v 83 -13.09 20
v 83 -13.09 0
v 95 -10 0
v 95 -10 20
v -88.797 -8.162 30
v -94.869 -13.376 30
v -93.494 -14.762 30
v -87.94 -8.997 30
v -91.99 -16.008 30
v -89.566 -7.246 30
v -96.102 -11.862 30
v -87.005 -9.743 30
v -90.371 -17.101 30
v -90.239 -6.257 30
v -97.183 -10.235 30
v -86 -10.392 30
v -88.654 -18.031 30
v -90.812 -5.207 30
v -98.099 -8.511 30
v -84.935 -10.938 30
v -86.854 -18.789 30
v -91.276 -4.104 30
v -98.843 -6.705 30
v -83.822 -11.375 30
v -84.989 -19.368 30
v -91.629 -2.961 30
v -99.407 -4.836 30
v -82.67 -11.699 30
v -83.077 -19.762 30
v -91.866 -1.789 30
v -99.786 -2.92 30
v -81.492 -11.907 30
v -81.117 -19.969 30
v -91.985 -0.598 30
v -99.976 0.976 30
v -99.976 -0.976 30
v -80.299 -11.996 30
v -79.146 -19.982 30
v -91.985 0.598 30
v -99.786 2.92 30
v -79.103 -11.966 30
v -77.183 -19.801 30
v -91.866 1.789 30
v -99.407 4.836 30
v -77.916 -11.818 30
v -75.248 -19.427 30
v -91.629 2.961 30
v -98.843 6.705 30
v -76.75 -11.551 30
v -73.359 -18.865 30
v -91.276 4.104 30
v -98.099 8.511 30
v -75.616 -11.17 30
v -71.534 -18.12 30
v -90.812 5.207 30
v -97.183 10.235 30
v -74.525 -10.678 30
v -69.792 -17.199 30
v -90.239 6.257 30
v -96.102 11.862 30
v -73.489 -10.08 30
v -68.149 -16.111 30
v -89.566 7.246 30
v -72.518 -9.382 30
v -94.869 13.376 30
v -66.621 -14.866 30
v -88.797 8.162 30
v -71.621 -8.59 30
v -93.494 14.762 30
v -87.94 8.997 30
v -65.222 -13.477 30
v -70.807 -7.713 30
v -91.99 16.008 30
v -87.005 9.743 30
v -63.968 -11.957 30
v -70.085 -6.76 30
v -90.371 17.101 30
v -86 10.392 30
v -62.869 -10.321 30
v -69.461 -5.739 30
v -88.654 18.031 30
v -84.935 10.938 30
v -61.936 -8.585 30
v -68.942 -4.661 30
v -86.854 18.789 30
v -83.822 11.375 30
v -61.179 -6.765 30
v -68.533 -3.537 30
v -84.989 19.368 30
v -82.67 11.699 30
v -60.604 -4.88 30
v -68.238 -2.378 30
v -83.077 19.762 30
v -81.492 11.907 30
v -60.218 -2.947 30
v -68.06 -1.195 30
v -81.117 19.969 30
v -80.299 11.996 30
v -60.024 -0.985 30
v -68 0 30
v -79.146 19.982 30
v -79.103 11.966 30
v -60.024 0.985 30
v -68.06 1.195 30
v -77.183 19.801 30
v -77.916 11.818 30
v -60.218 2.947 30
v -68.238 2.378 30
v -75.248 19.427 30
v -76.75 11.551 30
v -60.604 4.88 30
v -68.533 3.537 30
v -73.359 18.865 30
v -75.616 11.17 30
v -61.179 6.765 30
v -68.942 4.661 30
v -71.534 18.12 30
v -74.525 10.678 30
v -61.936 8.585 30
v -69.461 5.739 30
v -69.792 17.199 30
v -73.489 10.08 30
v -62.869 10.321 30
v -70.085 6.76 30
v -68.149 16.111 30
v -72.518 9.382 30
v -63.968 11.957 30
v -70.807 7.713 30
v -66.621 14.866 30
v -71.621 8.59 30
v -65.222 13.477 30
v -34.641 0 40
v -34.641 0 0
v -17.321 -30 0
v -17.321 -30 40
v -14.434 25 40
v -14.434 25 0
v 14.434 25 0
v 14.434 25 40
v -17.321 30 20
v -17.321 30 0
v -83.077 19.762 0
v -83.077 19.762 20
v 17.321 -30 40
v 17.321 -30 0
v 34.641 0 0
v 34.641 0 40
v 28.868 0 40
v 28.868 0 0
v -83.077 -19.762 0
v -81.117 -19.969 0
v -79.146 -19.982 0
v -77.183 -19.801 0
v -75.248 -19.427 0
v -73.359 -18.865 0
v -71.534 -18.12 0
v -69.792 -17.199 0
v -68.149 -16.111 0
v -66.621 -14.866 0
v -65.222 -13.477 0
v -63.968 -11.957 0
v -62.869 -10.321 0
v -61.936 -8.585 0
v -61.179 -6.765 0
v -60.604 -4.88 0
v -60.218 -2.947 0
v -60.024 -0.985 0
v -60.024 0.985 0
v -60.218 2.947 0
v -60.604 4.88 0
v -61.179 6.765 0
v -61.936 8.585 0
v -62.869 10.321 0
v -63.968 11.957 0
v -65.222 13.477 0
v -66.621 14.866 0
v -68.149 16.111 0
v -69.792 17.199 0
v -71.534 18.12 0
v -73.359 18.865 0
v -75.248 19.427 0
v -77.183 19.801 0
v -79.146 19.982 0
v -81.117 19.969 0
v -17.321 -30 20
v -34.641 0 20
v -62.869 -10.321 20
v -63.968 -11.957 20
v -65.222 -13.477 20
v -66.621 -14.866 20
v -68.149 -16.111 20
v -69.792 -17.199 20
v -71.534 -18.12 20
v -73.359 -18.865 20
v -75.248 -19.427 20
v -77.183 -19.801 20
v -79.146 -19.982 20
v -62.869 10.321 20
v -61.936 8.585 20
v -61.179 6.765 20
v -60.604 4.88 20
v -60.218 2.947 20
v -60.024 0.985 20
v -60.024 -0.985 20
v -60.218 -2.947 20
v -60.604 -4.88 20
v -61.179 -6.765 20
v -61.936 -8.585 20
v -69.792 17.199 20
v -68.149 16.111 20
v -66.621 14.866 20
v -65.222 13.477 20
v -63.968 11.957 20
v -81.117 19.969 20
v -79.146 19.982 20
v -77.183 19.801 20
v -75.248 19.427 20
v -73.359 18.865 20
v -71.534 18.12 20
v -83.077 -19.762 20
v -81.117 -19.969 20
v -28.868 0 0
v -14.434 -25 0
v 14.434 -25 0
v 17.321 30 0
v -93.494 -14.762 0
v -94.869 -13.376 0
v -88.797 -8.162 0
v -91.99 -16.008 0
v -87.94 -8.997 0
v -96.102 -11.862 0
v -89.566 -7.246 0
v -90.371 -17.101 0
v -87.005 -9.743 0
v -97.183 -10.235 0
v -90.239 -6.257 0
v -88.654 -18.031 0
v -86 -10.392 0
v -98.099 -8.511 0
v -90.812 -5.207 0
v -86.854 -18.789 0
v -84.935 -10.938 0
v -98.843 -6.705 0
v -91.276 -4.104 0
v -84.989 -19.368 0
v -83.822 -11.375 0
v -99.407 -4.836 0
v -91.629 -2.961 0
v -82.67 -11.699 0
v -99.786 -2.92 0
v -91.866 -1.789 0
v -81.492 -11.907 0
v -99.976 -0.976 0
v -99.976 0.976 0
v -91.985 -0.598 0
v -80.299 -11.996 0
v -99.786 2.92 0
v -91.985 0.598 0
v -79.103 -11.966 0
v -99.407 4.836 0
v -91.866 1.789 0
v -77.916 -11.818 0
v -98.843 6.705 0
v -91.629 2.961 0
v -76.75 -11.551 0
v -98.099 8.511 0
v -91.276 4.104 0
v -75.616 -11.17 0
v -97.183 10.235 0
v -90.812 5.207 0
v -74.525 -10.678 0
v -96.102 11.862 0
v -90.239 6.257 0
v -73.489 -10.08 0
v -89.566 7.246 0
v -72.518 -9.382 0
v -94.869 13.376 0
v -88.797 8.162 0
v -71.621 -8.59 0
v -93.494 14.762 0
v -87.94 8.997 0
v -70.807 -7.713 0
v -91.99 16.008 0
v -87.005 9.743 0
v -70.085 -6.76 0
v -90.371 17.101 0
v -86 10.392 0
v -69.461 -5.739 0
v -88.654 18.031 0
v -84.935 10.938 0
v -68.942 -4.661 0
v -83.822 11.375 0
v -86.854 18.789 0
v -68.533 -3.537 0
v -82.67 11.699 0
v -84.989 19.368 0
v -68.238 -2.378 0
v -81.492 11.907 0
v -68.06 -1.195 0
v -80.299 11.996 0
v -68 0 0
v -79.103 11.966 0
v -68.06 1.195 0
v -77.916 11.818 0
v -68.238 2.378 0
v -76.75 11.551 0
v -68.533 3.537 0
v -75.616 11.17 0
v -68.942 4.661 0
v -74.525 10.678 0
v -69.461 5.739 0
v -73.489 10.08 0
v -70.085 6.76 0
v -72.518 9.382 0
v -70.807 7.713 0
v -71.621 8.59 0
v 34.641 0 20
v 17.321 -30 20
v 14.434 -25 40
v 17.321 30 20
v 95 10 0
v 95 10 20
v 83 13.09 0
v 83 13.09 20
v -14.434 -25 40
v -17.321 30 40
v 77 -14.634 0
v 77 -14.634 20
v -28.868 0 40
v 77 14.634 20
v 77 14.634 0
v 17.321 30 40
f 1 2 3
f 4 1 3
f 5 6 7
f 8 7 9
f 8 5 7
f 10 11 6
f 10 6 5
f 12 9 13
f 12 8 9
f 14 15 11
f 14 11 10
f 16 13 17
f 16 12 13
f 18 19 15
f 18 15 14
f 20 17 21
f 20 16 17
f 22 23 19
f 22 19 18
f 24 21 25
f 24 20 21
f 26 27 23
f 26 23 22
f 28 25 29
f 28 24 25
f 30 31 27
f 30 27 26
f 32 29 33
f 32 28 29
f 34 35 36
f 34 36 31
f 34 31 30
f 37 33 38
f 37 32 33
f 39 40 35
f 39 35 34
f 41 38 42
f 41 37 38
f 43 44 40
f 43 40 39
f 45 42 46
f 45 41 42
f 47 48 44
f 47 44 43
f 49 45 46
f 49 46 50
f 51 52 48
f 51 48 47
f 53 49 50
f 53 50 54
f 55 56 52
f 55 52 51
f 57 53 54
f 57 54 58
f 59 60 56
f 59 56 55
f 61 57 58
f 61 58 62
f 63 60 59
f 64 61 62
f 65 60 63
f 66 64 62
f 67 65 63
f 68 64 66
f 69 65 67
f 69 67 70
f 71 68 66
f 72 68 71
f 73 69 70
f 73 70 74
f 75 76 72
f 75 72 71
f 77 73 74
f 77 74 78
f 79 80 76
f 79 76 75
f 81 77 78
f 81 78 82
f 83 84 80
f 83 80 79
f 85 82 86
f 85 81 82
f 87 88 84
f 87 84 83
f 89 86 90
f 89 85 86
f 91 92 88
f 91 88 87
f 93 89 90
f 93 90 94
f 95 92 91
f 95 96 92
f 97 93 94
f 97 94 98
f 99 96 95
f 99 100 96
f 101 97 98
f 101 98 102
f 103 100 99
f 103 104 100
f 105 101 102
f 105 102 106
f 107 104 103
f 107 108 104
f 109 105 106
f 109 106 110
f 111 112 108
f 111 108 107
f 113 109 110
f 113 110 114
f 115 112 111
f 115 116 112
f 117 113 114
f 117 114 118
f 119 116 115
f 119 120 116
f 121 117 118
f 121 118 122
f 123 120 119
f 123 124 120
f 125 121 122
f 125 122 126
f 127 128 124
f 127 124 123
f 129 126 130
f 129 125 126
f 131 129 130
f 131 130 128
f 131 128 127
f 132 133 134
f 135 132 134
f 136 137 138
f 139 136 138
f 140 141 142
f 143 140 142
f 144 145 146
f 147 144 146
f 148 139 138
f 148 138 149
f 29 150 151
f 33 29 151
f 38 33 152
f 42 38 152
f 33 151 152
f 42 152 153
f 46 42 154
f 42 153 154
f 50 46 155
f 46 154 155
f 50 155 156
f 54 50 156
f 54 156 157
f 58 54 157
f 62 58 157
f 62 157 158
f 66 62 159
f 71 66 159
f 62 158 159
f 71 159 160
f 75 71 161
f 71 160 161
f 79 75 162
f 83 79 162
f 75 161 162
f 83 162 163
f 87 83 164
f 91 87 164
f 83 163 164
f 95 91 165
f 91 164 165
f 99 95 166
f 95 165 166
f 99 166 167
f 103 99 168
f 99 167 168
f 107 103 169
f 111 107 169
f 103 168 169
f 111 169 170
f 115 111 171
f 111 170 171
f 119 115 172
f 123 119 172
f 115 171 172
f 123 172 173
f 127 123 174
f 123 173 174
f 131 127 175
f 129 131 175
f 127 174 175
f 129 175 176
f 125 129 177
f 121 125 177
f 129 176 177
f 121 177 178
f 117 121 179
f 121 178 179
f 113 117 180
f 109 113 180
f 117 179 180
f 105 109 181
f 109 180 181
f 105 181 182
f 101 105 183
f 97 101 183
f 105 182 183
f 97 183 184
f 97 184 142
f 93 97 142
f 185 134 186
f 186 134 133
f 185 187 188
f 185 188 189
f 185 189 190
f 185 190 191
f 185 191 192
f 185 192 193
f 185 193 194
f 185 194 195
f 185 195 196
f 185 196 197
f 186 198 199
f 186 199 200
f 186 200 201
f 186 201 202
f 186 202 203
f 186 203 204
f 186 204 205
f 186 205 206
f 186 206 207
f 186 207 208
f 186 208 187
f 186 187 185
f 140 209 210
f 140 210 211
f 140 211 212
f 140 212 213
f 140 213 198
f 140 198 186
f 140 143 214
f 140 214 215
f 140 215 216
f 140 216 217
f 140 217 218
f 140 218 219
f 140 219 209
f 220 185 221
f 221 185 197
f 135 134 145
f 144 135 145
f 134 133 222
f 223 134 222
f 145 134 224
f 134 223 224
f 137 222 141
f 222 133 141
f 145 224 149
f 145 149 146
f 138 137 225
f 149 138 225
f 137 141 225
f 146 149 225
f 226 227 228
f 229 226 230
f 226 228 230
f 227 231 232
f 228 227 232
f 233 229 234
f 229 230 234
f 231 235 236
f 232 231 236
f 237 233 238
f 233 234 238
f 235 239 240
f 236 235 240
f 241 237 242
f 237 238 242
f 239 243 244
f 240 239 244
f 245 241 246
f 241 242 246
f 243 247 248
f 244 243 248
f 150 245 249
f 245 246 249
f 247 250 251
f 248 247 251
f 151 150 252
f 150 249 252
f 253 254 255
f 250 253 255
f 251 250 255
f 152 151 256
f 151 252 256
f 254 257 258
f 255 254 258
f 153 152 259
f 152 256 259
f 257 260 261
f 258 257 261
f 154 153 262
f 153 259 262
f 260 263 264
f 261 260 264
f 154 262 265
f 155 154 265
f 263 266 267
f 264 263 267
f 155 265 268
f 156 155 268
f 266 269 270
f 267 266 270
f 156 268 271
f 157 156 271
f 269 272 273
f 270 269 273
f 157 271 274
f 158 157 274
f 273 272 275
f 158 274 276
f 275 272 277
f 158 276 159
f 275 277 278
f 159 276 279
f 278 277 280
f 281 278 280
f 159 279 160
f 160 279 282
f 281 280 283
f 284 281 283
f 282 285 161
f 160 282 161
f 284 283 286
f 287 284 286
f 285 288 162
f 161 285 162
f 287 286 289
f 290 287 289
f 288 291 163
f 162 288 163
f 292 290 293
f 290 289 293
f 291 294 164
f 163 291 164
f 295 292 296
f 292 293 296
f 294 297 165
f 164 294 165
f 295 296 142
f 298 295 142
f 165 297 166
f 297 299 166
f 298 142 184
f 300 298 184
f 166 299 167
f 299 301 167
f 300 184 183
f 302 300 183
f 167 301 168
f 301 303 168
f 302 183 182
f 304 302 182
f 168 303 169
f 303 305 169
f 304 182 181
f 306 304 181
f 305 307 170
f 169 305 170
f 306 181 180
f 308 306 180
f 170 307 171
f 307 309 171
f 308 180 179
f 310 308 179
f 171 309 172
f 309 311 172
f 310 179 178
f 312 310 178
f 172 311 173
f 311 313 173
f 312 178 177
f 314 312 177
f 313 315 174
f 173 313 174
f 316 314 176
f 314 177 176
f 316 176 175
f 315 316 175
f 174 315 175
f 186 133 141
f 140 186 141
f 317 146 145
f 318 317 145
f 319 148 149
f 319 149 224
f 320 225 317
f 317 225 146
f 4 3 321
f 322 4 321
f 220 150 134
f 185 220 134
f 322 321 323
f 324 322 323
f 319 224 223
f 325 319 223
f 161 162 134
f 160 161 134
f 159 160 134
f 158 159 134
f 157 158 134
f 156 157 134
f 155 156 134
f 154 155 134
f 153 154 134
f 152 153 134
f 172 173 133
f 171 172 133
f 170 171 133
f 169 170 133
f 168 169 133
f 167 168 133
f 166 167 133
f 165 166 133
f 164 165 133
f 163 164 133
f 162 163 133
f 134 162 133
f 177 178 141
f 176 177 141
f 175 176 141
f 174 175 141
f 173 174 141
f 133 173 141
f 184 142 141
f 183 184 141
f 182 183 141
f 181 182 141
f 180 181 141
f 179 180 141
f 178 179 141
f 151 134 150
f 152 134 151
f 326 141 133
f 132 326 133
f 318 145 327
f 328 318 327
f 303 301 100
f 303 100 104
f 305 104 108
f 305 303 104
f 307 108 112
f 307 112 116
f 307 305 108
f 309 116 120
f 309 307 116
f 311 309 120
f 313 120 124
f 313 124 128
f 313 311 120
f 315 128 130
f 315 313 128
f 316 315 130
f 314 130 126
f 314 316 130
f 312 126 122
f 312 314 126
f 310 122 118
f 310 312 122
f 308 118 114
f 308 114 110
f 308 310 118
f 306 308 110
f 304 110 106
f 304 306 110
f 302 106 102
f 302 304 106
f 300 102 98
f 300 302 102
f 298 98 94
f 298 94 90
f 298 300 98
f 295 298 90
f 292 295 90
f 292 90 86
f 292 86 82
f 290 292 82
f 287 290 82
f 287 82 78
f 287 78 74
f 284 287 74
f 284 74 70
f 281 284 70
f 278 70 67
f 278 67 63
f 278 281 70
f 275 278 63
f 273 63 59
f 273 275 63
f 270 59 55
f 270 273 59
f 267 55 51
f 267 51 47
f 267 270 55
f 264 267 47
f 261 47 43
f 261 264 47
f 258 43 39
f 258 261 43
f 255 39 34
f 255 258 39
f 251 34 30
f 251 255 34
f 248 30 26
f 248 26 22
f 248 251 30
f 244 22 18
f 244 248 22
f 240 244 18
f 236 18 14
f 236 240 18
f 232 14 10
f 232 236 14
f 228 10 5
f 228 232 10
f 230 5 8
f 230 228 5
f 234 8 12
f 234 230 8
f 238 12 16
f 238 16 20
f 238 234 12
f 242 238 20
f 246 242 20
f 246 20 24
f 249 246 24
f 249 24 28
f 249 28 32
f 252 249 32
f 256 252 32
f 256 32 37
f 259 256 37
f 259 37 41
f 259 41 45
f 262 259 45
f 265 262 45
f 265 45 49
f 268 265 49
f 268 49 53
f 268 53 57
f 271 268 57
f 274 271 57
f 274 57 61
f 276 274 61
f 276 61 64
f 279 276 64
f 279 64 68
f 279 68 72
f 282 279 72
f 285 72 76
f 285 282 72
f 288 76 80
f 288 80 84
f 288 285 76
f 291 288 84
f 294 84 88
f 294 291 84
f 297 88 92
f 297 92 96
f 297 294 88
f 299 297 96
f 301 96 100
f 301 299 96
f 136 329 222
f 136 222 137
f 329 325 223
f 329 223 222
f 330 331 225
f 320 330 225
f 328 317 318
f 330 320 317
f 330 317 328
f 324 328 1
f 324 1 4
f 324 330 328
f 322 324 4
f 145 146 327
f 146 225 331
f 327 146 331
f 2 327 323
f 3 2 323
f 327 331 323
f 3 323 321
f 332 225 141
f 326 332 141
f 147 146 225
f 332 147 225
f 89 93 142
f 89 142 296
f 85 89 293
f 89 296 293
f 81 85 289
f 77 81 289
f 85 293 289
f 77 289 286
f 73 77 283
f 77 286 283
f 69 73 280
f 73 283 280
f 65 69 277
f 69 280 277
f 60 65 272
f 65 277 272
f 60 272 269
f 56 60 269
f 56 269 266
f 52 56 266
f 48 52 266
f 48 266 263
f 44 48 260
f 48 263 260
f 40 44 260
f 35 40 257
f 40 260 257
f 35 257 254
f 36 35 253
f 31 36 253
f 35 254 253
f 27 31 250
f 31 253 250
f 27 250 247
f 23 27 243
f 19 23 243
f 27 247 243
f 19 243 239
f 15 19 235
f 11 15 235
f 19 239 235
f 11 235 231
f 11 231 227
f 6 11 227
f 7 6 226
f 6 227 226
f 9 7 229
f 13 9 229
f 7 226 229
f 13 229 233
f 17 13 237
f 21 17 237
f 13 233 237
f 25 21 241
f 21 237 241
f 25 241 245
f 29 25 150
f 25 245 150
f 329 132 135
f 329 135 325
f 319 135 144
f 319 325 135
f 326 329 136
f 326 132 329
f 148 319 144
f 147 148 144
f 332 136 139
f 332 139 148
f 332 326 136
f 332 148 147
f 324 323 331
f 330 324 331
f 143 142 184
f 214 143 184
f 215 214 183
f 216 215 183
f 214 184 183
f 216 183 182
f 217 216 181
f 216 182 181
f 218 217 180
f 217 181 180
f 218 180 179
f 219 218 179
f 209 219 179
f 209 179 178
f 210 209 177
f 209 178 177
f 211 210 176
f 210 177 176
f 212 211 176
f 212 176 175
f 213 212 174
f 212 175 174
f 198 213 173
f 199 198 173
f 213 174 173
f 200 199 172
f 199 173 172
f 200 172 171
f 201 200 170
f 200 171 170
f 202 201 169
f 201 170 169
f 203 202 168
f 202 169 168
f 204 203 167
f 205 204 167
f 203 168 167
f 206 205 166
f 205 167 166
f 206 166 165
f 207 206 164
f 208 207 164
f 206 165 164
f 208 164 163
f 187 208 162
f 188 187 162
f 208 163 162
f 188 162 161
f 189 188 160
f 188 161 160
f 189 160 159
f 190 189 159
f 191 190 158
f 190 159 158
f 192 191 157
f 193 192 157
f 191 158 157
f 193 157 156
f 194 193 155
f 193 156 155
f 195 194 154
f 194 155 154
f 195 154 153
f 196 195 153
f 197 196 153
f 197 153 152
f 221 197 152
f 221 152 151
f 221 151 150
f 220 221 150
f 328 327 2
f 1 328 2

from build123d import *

# Parameters (mm, degrees)
F1_DEPTH = 40
F0_R     = 12
F2_DEPTH = 30
F3_DEPTH = 20


with BuildPart() as f1:
    # F0 (on Top) → F1 (new body)
    with BuildSketch(Plane.XY):
        Polygon((17.3205080757, 30), (-17.3205080757, 30), (-34.6410161514, 0), (-17.3205080757, -30), (0, -30), (17.3205080757, -30), (34.6410161514, 0), align=None)
        Polygon((-28.8675134595, 0), (-14.4337567297, 25), (14.4337567297, 25), (28.8675134595, 0), (14.4337567297, -25), (-14.4337567297, -25), align=None, mode=Mode.SUBTRACT)
    extrude(amount=F1_DEPTH)


with BuildPart() as f2:
    # F0 (on Top) → F2 (new body)
    with BuildSketch(Plane.XY):
        with BuildLine():
            ThreePointArc((-60, 0), (-66.991109672, 15.1910754206), (-83.0768772434, 19.7619034111))
            ThreePointArc((-83.0768772434, 19.7619034111), (-100, 0), (-83.0768772434, -19.7619034111))
            ThreePointArc((-83.0768772434, -19.7619034111), (-66.991109672, -15.1910754206), (-60, 0))
        make_face()
        with Locations((-80, 0)):
            Circle(F0_R, mode=Mode.SUBTRACT)
    extrude(amount=F2_DEPTH)


with BuildPart() as f3:
    # F0 (on Top) → F3 (new body)
    with BuildSketch(Plane.XY):
        with BuildLine():
            Line((-34.6410161514, 0), (-17.3205080757, 30))
            Line((-17.3205080757, 30), (-83.0768772434, 19.7619034111))
            ThreePointArc((-83.0768772434, 19.7619034111), (-66.991109672, 15.1910754206), (-60, 0))
            ThreePointArc((-60, 0), (-66.991109672, -15.1910754206), (-83.0768772434, -19.7619034111))
            Line((-83.0768772434, -19.7619034111), (-17.3205080757, -30))
            Line((-17.3205080757, -30), (-34.6410161514, 0))
        make_face()
    extrude(amount=F3_DEPTH)


with BuildPart() as f3b:
    # F0 (on Top) → F3, piece 2 (new body)
    with BuildSketch(Plane.XY):
        Polygon((77, 14.6344278404), (17.3205080757, 30), (34.6410161514, 0), (17.3205080757, -30), (77, -14.6344278404), align=None)
        Polygon((95, 0), (83, 0), (83, -13.0896185602), (95, -10), align=None)
        Polygon((95, 10), (83, 13.0896185602), (83, 0), (95, 0), align=None)
        Polygon((83, 0), (80, 0), (80, -13.8620232003), (83, -13.0896185602), align=None)
        Polygon((80, 13.8620232003), (77, 14.6344278404), (77, -14.6344278404), (80, -13.8620232003), (80, 0), align=None)
        Polygon((83, 13.0896185602), (80, 13.8620232003), (80, 0), (83, 0), align=None)
    extrude(amount=F3_DEPTH)


solid = Compound([f1.part, f2.part, f3.part, f3b.part])
